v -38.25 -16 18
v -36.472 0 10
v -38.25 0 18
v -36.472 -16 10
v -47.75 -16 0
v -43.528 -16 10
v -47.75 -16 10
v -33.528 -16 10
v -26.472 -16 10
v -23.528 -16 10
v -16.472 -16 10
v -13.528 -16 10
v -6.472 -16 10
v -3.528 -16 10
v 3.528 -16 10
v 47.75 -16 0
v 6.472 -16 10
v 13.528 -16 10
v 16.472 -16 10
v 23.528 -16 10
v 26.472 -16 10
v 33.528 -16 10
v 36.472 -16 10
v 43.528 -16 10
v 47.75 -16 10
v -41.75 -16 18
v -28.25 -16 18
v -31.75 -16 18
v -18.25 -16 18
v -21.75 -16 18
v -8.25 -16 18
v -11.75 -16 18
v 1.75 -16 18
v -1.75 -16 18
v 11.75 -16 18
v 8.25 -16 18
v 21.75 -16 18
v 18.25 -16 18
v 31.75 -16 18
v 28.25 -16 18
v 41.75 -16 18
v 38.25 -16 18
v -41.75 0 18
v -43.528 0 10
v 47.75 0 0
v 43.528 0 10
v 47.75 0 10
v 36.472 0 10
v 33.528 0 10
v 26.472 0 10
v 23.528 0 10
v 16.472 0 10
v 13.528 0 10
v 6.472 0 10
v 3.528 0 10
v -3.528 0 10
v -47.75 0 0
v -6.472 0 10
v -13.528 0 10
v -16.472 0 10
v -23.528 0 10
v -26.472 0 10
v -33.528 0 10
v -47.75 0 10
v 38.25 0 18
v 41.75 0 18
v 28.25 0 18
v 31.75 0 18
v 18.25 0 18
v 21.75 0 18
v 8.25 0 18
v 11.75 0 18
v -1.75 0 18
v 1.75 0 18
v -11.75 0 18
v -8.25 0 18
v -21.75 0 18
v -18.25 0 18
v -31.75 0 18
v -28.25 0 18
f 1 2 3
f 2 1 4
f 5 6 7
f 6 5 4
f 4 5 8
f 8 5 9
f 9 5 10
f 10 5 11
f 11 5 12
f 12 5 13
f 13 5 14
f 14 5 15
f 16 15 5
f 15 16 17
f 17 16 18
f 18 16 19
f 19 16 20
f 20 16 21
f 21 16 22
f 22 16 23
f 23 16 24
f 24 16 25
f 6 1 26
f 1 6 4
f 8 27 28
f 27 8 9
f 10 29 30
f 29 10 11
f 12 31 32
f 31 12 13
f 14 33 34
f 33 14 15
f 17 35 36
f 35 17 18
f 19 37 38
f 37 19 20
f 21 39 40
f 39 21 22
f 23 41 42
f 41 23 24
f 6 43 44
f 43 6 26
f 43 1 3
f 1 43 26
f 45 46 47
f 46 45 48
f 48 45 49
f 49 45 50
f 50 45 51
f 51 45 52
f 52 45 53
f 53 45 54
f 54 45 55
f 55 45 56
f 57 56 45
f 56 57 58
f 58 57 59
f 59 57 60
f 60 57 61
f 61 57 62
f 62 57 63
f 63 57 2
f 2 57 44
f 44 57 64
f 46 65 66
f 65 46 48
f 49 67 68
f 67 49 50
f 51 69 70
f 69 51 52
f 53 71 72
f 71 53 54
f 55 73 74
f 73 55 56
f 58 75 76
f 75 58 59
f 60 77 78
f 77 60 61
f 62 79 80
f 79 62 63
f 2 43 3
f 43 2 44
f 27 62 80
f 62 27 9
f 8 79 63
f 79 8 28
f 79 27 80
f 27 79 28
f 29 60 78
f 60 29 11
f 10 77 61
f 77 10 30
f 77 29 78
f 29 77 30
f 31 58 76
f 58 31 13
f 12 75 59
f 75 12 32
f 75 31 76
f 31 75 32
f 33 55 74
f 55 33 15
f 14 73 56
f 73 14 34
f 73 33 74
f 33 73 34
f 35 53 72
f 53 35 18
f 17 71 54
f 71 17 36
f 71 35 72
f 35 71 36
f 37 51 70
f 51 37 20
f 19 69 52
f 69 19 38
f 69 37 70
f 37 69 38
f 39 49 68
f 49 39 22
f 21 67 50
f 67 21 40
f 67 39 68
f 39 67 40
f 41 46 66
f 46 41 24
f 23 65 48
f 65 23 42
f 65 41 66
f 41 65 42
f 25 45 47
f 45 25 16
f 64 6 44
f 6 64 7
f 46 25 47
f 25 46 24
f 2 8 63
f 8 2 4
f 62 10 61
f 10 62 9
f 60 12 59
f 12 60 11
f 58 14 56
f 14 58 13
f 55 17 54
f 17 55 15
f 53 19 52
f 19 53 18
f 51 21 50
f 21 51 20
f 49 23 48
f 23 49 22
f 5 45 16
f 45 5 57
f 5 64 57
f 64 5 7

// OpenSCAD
$fn = 32;

// ----------------------------------------------------------------------
// Toothed rack, 9 teeth
// 10 mm pitch, 8 mm teeth
// ----------------------------------------------------------------------

// --- parameters (mm) ---
bar_w = 16;     // bar width (Y)
bar_h = 10;     // bar height (Z)
teeth = 9;      // number of teeth
pitch = 10;     // tooth pitch
tooth_h = 8;    // tooth height above the bar
root_w = 7.5;   // tooth width at the root
crest_w = 3.5;  // tooth width at the crest

// --- derived feature positions (mm) ---
span = (teeth - 1) * pitch;  // = 80   distance between the outer teeth
bar_l = span + root_w + 8;   // = 95.5   bar length: teeth plus 4 mm at each end
tooth_x = -span / 2;         // = -40   X of the first tooth
height = bar_h + tooth_h;    // = 18   overall height
feature_centers = [
  [tooth_x + 0 * pitch, -bar_w / 2],
  [tooth_x + 1 * pitch, -bar_w / 2],
  [tooth_x + 2 * pitch, -bar_w / 2],
  [tooth_x + 3 * pitch, -bar_w / 2],
  [tooth_x + 4 * pitch, -bar_w / 2],
  [tooth_x + 5 * pitch, -bar_w / 2],
  [tooth_x + 6 * pitch, -bar_w / 2],
  [tooth_x + 7 * pitch, -bar_w / 2],
  [tooth_x + 8 * pitch, -bar_w / 2]
];   // tooth centre line, drives the tooth loop

// bar with a rack of teeth, one extruded trapezoium per centre
module rack_tooth() {
  linear_extrude(height = bar_w)
    polygon(points = [
      [0, 0],
      [root_w, 0],
      [root_w / 2 + crest_w / 2, tooth_h + 1],
      [root_w / 2 - crest_w / 2, tooth_h + 1]
    ]);
}

union() {
  translate([-bar_l / 2, -bar_w, 0]) cube([bar_l, bar_w, bar_h]);
  for (centre = feature_centers)
    translate([centre[0] - root_w / 2, 0, bar_h - 1]) rotate([90, 0, 0]) rack_tooth();
}
